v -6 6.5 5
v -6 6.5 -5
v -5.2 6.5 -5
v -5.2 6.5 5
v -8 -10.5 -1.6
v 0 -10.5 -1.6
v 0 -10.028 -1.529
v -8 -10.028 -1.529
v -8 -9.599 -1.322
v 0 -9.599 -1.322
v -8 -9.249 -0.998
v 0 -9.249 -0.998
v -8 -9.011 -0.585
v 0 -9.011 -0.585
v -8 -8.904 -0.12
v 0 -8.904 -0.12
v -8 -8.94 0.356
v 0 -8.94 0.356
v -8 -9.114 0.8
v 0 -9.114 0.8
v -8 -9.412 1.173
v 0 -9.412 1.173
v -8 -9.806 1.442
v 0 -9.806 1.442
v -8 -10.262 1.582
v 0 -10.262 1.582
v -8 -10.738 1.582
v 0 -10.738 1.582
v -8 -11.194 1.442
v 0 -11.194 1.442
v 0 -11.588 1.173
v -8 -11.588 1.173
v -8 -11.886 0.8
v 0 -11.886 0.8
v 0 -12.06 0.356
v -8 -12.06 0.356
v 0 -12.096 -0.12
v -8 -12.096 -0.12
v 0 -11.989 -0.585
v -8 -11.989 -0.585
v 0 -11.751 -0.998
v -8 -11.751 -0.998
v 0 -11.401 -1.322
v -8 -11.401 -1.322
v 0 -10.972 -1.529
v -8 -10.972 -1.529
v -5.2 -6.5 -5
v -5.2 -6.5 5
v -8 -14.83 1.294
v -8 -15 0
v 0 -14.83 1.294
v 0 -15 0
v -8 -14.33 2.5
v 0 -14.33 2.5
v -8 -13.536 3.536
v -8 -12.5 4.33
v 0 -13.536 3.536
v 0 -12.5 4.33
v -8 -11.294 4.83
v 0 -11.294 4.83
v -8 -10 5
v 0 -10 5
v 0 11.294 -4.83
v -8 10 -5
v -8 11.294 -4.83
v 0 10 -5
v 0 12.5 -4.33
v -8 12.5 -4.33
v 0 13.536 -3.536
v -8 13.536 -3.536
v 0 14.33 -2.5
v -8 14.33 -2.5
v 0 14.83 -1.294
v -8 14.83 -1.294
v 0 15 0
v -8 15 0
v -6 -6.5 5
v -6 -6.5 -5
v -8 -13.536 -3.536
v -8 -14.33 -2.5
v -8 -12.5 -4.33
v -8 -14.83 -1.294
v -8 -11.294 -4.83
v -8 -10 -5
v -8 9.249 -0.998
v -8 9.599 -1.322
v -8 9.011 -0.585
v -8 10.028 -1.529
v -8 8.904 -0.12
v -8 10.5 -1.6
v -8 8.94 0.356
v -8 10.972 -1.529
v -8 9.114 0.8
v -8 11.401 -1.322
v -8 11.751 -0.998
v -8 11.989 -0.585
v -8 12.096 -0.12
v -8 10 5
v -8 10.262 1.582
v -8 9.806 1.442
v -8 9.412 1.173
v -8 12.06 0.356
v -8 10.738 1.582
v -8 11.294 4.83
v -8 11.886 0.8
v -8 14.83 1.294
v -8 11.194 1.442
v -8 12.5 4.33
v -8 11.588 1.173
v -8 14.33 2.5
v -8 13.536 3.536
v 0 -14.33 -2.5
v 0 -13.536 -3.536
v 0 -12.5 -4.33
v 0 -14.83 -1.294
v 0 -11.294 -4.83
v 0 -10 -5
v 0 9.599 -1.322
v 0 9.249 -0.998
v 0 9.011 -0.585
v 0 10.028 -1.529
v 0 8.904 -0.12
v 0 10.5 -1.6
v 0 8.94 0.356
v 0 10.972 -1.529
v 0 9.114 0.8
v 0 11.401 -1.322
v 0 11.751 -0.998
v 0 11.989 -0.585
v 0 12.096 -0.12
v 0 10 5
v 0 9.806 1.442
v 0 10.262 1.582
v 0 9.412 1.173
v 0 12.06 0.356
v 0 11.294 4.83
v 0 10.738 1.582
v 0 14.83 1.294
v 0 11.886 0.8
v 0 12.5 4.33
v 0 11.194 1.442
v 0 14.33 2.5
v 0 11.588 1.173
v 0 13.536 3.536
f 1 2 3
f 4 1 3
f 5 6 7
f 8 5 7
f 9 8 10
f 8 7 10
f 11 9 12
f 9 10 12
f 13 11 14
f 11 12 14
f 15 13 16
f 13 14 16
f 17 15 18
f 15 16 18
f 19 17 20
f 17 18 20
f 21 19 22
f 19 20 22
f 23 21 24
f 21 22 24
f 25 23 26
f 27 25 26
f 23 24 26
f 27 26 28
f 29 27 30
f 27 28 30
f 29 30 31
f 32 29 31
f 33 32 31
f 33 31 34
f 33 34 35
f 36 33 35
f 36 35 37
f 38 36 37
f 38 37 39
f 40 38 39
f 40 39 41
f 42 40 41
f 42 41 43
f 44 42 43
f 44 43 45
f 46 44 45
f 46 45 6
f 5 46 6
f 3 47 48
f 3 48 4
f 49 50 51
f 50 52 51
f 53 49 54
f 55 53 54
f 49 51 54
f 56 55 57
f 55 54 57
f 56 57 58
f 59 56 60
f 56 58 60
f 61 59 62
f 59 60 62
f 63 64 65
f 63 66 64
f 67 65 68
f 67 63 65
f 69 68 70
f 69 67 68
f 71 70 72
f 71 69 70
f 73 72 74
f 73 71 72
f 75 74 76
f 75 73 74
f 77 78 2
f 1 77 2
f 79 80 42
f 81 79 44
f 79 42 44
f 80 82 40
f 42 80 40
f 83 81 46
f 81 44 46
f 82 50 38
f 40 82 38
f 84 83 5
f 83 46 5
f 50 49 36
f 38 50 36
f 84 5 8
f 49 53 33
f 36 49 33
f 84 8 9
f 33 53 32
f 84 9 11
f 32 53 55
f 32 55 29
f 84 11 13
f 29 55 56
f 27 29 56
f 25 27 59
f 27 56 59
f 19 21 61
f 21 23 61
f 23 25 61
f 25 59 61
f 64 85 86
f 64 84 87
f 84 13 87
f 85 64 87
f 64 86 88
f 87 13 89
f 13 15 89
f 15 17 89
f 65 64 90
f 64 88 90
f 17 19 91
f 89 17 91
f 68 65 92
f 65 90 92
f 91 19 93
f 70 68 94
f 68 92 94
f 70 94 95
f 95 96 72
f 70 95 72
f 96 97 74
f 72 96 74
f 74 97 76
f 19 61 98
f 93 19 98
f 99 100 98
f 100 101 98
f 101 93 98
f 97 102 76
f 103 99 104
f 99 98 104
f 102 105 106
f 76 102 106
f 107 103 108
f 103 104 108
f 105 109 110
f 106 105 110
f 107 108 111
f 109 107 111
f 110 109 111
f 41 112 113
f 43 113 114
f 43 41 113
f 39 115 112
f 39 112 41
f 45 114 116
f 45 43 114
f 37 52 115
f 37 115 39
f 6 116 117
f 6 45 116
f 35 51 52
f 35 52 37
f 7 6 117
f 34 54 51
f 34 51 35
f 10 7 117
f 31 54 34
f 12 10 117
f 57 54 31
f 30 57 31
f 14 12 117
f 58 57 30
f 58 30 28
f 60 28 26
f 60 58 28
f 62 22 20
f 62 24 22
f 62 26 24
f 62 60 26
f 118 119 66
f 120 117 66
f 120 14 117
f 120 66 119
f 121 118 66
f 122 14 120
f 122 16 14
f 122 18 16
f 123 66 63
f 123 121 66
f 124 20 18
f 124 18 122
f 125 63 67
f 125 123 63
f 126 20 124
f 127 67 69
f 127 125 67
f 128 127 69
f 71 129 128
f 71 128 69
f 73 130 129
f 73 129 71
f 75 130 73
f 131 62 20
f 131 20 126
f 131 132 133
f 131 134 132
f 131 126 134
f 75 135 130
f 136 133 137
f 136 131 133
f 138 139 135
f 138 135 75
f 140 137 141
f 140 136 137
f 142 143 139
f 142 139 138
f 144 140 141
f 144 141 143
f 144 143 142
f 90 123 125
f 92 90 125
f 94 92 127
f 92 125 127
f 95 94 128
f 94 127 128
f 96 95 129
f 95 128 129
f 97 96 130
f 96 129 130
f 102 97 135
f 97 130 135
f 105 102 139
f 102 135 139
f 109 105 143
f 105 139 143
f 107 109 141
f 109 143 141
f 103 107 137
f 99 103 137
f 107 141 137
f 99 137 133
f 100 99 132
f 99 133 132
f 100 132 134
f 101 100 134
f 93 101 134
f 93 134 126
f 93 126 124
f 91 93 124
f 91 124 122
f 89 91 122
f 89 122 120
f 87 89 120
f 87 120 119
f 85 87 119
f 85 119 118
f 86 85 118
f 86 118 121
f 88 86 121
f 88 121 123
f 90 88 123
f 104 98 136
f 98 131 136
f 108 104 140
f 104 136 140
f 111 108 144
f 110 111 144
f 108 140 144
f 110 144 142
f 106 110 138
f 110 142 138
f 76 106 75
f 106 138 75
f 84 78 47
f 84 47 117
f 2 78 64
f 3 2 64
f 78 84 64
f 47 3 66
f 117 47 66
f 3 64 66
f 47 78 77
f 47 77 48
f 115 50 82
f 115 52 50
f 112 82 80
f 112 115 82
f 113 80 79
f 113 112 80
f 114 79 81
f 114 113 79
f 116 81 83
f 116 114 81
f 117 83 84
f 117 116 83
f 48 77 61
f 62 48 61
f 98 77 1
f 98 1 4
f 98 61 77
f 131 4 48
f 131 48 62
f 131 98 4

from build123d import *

# Parameters (mm, degrees)
SKIZZE1_W                            = 8
SKIZZE1_H                            = 30
AUFSATZ_LINEAR_AUSTRAGEN1_DEPTH      = 5
SKIZZE4_R                            = 1.6
SCHNITT_LINEAR_AUSTRAGEN4_DEPTH      = 18.720045147
VERRUNDUNG1_R                        = 5
SCHNITT_LINEAR_AUSTRAGEN5_DEPTH      = 18.720045147
SCHNITT_LINEAR_AUSTRAGEN5_DEPTH_BACK = 18.720045147
SKIZZE5_W                            = 0.8
SKIZZE5_H                            = 13


with BuildPart() as part:
    # Skizze1 → Aufsatz-Linear austragen1 (new, symmetric)
    with BuildSketch(Plane.XY):
        with Locations((-4, 0)):
            Rectangle(SKIZZE1_W, SKIZZE1_H)
    extrude(amount=AUFSATZ_LINEAR_AUSTRAGEN1_DEPTH, both=True)

    # Skizze4 → Schnitt-Linear austragen4 (cut, through all)
    with BuildSketch(Plane(origin=(0, 0, 0), x_dir=(0, 0, -1), z_dir=(1, 0, 0))):
        with Locations((0, 10.5)):
            Circle(SKIZZE4_R)
        with Locations((0, -10.5)):
            Circle(SKIZZE4_R)
    extrude(amount=-SCHNITT_LINEAR_AUSTRAGEN4_DEPTH, mode=Mode.SUBTRACT)

    # Verrundung1
    verrundung1_edges = [part.edges().sort_by_distance(p)[0] for p in [
        (-4, 15, 5),
        (-4, 15, -5),
        (-4, -15, 5),
        (-4, -15, -5),
    ]]
    fillet(verrundung1_edges, radius=VERRUNDUNG1_R - 0.0001)  # a hair under: the kernel refuses the full size

    # Skizze5 → Schnitt-Linear austragen5 (cut, two sides: drawn at the far end of the back side and taken through both)
    with BuildSketch(Plane.XY.offset(-SCHNITT_LINEAR_AUSTRAGEN5_DEPTH_BACK)):
        with Locations((-5.6, 0)):
            Rectangle(SKIZZE5_W, SKIZZE5_H)
    extrude(amount=SCHNITT_LINEAR_AUSTRAGEN5_DEPTH + SCHNITT_LINEAR_AUSTRAGEN5_DEPTH_BACK, mode=Mode.SUBTRACT)


solid = part.part
